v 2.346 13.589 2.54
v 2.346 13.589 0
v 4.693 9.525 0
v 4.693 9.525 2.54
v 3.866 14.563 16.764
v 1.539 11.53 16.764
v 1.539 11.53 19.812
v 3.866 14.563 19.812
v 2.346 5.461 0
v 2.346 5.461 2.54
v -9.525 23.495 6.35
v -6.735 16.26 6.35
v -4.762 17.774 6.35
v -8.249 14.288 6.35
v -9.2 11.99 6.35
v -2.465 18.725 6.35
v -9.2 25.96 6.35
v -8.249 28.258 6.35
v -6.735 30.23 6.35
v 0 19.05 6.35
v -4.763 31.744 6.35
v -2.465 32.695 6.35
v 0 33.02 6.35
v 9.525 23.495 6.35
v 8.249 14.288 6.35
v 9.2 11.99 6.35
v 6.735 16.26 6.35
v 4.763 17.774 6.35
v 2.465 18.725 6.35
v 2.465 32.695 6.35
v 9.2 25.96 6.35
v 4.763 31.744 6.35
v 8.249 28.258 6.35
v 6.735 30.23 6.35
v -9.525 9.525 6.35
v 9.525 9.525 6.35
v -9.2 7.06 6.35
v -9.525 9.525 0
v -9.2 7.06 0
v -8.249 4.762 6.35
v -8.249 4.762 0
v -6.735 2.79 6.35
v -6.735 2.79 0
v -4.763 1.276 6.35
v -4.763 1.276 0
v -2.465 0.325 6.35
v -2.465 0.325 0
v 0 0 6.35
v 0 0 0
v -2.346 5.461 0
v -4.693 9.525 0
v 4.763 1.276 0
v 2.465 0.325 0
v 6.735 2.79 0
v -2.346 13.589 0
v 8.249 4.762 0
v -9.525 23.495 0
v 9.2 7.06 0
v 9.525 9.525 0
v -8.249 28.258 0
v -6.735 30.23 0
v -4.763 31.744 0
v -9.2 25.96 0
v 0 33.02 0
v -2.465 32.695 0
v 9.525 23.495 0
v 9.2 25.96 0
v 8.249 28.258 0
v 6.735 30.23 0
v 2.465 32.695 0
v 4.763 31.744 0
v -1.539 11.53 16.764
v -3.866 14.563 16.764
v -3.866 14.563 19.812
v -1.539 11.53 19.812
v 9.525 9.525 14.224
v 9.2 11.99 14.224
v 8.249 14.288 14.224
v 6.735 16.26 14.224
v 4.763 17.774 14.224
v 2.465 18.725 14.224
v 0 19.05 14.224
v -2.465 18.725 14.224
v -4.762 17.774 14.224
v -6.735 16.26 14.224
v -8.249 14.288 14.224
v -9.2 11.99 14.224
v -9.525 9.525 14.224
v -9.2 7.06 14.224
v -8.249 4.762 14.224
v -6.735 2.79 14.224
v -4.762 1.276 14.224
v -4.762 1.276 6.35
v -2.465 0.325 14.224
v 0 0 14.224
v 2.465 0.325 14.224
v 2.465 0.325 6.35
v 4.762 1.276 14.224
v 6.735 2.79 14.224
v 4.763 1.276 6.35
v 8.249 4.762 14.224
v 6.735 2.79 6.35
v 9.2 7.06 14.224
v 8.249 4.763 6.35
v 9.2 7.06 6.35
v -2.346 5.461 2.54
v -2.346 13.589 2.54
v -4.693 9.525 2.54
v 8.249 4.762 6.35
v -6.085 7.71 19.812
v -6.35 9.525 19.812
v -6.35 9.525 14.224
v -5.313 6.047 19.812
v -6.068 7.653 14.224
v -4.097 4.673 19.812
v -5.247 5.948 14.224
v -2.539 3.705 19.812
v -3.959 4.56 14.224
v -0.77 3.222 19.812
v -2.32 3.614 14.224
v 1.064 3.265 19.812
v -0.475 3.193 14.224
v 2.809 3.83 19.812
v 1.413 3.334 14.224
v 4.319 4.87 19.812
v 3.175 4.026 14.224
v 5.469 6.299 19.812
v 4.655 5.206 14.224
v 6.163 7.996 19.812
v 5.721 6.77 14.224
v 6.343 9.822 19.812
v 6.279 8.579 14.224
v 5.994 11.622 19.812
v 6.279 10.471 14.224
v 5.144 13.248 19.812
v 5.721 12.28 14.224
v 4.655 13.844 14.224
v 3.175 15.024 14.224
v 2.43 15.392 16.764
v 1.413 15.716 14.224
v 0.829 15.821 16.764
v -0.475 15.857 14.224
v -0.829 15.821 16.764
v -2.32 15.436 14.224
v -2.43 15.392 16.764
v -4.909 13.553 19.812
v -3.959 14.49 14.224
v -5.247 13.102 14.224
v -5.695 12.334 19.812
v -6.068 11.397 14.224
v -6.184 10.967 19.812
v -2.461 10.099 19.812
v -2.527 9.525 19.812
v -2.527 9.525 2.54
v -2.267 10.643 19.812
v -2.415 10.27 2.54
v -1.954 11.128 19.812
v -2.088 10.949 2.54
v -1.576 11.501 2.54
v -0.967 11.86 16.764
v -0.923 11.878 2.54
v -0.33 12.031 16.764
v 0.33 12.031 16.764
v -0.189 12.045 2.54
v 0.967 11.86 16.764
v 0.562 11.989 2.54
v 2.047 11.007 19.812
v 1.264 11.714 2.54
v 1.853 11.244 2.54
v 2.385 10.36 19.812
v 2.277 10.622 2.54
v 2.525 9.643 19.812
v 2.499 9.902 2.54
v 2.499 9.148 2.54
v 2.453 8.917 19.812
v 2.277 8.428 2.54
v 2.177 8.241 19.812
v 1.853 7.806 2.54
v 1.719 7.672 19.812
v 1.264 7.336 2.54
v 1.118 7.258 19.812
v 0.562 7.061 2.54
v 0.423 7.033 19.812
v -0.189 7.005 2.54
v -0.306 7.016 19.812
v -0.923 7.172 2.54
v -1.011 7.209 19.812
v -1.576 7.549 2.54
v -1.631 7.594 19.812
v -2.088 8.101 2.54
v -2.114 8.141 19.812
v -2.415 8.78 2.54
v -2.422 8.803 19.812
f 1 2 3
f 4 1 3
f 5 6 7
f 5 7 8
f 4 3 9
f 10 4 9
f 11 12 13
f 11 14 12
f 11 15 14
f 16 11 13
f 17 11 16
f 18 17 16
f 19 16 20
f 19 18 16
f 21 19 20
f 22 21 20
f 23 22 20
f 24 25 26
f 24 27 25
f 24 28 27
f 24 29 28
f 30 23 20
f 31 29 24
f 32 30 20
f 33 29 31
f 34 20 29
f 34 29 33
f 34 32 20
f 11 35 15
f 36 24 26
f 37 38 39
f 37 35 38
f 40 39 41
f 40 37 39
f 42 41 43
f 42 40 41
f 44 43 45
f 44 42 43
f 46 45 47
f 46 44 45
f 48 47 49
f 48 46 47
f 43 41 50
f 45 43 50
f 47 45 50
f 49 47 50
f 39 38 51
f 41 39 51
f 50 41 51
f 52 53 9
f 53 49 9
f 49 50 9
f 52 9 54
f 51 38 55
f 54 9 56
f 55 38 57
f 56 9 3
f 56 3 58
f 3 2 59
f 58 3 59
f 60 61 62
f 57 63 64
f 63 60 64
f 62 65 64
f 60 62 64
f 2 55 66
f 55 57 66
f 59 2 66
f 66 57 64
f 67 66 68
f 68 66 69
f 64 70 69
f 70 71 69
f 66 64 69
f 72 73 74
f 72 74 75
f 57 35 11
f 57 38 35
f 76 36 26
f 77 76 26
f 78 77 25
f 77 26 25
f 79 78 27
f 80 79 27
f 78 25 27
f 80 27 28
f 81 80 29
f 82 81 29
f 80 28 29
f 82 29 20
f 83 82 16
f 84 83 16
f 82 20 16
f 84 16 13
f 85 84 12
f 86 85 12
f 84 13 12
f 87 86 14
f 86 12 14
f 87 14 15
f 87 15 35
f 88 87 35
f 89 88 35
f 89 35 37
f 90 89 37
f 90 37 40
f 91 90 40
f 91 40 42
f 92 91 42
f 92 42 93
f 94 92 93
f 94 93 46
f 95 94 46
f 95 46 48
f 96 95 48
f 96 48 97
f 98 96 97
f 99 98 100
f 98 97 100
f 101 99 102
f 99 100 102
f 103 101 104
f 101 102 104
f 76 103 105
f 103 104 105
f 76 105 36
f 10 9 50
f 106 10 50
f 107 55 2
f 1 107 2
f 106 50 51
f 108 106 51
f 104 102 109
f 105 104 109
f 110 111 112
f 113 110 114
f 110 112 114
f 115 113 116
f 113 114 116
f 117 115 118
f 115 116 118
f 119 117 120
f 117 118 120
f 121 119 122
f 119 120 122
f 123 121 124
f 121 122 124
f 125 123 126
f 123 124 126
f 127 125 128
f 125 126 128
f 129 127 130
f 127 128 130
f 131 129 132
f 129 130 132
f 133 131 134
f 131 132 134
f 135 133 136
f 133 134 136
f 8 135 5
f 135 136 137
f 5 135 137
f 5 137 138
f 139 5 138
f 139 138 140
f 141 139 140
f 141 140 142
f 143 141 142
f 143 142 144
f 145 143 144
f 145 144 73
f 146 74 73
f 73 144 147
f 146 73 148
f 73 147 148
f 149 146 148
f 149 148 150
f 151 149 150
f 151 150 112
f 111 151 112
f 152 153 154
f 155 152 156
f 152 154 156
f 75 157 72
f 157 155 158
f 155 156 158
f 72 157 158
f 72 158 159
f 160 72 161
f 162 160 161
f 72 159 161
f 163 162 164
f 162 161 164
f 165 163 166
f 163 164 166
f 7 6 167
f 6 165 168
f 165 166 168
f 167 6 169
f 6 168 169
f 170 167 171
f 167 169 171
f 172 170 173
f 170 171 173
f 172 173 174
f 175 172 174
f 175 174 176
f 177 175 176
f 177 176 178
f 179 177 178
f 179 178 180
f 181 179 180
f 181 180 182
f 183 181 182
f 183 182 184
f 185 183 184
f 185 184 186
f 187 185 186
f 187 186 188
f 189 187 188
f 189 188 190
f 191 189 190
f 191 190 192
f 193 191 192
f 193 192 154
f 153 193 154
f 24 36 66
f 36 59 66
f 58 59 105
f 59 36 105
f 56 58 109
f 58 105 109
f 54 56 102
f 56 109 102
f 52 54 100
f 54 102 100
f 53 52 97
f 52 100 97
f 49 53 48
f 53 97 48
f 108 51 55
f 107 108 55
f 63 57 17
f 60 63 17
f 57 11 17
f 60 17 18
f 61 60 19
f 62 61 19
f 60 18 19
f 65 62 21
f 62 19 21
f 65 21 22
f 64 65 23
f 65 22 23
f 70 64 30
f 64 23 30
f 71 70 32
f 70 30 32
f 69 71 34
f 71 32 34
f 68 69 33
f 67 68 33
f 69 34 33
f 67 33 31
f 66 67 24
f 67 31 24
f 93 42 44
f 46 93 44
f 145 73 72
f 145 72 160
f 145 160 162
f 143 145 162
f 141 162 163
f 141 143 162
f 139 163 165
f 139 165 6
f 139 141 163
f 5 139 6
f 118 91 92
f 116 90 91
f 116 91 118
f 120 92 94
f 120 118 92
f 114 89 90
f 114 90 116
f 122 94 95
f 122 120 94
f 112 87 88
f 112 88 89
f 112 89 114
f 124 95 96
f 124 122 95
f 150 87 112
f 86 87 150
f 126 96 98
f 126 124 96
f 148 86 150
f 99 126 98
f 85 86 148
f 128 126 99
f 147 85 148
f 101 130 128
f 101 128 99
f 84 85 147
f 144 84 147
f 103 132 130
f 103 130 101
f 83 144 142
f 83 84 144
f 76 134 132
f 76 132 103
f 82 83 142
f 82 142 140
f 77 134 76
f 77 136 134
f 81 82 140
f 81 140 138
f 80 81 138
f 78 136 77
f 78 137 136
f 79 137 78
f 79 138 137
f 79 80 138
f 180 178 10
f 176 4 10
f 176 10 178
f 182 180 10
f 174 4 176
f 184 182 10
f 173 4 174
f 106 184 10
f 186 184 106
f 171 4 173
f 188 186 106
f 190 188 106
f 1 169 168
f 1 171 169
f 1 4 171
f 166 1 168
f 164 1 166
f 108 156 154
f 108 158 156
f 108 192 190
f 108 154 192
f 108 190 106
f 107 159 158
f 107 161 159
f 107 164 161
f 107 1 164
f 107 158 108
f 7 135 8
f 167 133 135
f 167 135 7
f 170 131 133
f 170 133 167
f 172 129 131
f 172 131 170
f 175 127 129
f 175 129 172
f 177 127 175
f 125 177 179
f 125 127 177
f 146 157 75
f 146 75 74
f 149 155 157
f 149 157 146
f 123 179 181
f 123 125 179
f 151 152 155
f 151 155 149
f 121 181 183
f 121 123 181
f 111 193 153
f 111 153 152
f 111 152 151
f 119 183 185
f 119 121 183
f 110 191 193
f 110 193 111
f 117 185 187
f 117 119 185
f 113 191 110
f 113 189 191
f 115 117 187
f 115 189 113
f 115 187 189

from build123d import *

# Parameters (mm, degrees)
SKETCH1_W                  = 19.05
SKETCH1_H                  = 33.02
BOSS_EXTRUDE1_DEPTH        = 6.35
SKETCH2_R                  = 6.35
BOSS_EXTRUDE2_DEPTH        = 13.462
F_8_0_199_DIAMETER_HOLE1_D = 5.0546
CUT_EXTRUDE1_DEPTH         = 2.54
SKETCH7_R                  = 9.525
SKETCH7_R_2                = 6.35
BOSS_EXTRUDE3_DEPTH        = 7.874
CUT_EXTRUDE2_START         = -3.048
CUT_EXTRUDE2_DEPTH         = 3.048
FILLET1_R                  = 9.525


with BuildPart() as part:
    # Sketch1 → Boss-Extrude1 (new body)
    with BuildSketch(Plane.XY):
        with Locations((0, 16.51)):
            Rectangle(SKETCH1_W, SKETCH1_H)
    extrude(amount=BOSS_EXTRUDE1_DEPTH)

    # Sketch2 → Boss-Extrude2 (add)
    with BuildSketch(Plane.XY.offset(6.35)):
        with Locations(Location((0, 9.525, 0), (0, 0, 180))):
            Circle(SKETCH2_R)
    extrude(amount=BOSS_EXTRUDE2_DEPTH)

    # #8 (0.199) Diameter Hole1 (through all)
    with Locations(Plane.XY.offset(19.812)):
        with Locations((0, 9.525)):
            Hole(F_8_0_199_DIAMETER_HOLE1_D / 2)

    # Sketch5 → Cut-Extrude1 (cut)
    with BuildSketch(Plane(origin=(0, 0, 0), x_dir=(-1, 0, 0), z_dir=(0, 0, -1))):
        Polygon((2.346351494, 5.461), (4.692702988, 9.525), (2.346351494, 13.589), (-2.346351494, 13.589), (-4.692702988, 9.525), (-2.346351494, 5.461), align=None)
    extrude(amount=-CUT_EXTRUDE1_DEPTH, mode=Mode.SUBTRACT)

    # Sketch7 → Boss-Extrude3 (add)
    with BuildSketch(Plane.XY.offset(6.35)):
        with Locations((0, 9.525)):
            Circle(SKETCH7_R)
        with Locations((0, 9.525)):
            Circle(SKETCH7_R_2, mode=Mode.SUBTRACT)
    extrude(amount=BOSS_EXTRUDE3_DEPTH)

    # Sketch8 → Cut-Extrude2 (cut)
    with BuildSketch(Plane.XY.offset(19.812).offset(CUT_EXTRUDE2_START)):
        with BuildLine():
            Line((1.53852276, 11.530041897), (3.865635074, 14.562793711))
            ThreePointArc((3.865635074, 14.562793711), (0, 15.875), (-3.865635074, 14.562793711))
            Line((-3.865635074, 14.562793711), (-1.53852276, 11.530041897))
            ThreePointArc((-1.53852276, 11.530041897), (0, 12.0523), (1.53852276, 11.530041897))
        make_face()
    extrude(amount=CUT_EXTRUDE2_DEPTH, mode=Mode.SUBTRACT)

    # Fillet1
    fillet1_edges = [part.edges().sort_by_distance(p)[0] for p in [
        (9.525, 0, 3.175),
        (-9.525, 0, 3.175),
        (9.525, 33.02, 3.175),
        (-9.525, 33.02, 3.175),
    ]]
    fillet(fillet1_edges, radius=FILLET1_R - 0.0001)  # a hair under: the kernel refuses the full size


solid = part.part
